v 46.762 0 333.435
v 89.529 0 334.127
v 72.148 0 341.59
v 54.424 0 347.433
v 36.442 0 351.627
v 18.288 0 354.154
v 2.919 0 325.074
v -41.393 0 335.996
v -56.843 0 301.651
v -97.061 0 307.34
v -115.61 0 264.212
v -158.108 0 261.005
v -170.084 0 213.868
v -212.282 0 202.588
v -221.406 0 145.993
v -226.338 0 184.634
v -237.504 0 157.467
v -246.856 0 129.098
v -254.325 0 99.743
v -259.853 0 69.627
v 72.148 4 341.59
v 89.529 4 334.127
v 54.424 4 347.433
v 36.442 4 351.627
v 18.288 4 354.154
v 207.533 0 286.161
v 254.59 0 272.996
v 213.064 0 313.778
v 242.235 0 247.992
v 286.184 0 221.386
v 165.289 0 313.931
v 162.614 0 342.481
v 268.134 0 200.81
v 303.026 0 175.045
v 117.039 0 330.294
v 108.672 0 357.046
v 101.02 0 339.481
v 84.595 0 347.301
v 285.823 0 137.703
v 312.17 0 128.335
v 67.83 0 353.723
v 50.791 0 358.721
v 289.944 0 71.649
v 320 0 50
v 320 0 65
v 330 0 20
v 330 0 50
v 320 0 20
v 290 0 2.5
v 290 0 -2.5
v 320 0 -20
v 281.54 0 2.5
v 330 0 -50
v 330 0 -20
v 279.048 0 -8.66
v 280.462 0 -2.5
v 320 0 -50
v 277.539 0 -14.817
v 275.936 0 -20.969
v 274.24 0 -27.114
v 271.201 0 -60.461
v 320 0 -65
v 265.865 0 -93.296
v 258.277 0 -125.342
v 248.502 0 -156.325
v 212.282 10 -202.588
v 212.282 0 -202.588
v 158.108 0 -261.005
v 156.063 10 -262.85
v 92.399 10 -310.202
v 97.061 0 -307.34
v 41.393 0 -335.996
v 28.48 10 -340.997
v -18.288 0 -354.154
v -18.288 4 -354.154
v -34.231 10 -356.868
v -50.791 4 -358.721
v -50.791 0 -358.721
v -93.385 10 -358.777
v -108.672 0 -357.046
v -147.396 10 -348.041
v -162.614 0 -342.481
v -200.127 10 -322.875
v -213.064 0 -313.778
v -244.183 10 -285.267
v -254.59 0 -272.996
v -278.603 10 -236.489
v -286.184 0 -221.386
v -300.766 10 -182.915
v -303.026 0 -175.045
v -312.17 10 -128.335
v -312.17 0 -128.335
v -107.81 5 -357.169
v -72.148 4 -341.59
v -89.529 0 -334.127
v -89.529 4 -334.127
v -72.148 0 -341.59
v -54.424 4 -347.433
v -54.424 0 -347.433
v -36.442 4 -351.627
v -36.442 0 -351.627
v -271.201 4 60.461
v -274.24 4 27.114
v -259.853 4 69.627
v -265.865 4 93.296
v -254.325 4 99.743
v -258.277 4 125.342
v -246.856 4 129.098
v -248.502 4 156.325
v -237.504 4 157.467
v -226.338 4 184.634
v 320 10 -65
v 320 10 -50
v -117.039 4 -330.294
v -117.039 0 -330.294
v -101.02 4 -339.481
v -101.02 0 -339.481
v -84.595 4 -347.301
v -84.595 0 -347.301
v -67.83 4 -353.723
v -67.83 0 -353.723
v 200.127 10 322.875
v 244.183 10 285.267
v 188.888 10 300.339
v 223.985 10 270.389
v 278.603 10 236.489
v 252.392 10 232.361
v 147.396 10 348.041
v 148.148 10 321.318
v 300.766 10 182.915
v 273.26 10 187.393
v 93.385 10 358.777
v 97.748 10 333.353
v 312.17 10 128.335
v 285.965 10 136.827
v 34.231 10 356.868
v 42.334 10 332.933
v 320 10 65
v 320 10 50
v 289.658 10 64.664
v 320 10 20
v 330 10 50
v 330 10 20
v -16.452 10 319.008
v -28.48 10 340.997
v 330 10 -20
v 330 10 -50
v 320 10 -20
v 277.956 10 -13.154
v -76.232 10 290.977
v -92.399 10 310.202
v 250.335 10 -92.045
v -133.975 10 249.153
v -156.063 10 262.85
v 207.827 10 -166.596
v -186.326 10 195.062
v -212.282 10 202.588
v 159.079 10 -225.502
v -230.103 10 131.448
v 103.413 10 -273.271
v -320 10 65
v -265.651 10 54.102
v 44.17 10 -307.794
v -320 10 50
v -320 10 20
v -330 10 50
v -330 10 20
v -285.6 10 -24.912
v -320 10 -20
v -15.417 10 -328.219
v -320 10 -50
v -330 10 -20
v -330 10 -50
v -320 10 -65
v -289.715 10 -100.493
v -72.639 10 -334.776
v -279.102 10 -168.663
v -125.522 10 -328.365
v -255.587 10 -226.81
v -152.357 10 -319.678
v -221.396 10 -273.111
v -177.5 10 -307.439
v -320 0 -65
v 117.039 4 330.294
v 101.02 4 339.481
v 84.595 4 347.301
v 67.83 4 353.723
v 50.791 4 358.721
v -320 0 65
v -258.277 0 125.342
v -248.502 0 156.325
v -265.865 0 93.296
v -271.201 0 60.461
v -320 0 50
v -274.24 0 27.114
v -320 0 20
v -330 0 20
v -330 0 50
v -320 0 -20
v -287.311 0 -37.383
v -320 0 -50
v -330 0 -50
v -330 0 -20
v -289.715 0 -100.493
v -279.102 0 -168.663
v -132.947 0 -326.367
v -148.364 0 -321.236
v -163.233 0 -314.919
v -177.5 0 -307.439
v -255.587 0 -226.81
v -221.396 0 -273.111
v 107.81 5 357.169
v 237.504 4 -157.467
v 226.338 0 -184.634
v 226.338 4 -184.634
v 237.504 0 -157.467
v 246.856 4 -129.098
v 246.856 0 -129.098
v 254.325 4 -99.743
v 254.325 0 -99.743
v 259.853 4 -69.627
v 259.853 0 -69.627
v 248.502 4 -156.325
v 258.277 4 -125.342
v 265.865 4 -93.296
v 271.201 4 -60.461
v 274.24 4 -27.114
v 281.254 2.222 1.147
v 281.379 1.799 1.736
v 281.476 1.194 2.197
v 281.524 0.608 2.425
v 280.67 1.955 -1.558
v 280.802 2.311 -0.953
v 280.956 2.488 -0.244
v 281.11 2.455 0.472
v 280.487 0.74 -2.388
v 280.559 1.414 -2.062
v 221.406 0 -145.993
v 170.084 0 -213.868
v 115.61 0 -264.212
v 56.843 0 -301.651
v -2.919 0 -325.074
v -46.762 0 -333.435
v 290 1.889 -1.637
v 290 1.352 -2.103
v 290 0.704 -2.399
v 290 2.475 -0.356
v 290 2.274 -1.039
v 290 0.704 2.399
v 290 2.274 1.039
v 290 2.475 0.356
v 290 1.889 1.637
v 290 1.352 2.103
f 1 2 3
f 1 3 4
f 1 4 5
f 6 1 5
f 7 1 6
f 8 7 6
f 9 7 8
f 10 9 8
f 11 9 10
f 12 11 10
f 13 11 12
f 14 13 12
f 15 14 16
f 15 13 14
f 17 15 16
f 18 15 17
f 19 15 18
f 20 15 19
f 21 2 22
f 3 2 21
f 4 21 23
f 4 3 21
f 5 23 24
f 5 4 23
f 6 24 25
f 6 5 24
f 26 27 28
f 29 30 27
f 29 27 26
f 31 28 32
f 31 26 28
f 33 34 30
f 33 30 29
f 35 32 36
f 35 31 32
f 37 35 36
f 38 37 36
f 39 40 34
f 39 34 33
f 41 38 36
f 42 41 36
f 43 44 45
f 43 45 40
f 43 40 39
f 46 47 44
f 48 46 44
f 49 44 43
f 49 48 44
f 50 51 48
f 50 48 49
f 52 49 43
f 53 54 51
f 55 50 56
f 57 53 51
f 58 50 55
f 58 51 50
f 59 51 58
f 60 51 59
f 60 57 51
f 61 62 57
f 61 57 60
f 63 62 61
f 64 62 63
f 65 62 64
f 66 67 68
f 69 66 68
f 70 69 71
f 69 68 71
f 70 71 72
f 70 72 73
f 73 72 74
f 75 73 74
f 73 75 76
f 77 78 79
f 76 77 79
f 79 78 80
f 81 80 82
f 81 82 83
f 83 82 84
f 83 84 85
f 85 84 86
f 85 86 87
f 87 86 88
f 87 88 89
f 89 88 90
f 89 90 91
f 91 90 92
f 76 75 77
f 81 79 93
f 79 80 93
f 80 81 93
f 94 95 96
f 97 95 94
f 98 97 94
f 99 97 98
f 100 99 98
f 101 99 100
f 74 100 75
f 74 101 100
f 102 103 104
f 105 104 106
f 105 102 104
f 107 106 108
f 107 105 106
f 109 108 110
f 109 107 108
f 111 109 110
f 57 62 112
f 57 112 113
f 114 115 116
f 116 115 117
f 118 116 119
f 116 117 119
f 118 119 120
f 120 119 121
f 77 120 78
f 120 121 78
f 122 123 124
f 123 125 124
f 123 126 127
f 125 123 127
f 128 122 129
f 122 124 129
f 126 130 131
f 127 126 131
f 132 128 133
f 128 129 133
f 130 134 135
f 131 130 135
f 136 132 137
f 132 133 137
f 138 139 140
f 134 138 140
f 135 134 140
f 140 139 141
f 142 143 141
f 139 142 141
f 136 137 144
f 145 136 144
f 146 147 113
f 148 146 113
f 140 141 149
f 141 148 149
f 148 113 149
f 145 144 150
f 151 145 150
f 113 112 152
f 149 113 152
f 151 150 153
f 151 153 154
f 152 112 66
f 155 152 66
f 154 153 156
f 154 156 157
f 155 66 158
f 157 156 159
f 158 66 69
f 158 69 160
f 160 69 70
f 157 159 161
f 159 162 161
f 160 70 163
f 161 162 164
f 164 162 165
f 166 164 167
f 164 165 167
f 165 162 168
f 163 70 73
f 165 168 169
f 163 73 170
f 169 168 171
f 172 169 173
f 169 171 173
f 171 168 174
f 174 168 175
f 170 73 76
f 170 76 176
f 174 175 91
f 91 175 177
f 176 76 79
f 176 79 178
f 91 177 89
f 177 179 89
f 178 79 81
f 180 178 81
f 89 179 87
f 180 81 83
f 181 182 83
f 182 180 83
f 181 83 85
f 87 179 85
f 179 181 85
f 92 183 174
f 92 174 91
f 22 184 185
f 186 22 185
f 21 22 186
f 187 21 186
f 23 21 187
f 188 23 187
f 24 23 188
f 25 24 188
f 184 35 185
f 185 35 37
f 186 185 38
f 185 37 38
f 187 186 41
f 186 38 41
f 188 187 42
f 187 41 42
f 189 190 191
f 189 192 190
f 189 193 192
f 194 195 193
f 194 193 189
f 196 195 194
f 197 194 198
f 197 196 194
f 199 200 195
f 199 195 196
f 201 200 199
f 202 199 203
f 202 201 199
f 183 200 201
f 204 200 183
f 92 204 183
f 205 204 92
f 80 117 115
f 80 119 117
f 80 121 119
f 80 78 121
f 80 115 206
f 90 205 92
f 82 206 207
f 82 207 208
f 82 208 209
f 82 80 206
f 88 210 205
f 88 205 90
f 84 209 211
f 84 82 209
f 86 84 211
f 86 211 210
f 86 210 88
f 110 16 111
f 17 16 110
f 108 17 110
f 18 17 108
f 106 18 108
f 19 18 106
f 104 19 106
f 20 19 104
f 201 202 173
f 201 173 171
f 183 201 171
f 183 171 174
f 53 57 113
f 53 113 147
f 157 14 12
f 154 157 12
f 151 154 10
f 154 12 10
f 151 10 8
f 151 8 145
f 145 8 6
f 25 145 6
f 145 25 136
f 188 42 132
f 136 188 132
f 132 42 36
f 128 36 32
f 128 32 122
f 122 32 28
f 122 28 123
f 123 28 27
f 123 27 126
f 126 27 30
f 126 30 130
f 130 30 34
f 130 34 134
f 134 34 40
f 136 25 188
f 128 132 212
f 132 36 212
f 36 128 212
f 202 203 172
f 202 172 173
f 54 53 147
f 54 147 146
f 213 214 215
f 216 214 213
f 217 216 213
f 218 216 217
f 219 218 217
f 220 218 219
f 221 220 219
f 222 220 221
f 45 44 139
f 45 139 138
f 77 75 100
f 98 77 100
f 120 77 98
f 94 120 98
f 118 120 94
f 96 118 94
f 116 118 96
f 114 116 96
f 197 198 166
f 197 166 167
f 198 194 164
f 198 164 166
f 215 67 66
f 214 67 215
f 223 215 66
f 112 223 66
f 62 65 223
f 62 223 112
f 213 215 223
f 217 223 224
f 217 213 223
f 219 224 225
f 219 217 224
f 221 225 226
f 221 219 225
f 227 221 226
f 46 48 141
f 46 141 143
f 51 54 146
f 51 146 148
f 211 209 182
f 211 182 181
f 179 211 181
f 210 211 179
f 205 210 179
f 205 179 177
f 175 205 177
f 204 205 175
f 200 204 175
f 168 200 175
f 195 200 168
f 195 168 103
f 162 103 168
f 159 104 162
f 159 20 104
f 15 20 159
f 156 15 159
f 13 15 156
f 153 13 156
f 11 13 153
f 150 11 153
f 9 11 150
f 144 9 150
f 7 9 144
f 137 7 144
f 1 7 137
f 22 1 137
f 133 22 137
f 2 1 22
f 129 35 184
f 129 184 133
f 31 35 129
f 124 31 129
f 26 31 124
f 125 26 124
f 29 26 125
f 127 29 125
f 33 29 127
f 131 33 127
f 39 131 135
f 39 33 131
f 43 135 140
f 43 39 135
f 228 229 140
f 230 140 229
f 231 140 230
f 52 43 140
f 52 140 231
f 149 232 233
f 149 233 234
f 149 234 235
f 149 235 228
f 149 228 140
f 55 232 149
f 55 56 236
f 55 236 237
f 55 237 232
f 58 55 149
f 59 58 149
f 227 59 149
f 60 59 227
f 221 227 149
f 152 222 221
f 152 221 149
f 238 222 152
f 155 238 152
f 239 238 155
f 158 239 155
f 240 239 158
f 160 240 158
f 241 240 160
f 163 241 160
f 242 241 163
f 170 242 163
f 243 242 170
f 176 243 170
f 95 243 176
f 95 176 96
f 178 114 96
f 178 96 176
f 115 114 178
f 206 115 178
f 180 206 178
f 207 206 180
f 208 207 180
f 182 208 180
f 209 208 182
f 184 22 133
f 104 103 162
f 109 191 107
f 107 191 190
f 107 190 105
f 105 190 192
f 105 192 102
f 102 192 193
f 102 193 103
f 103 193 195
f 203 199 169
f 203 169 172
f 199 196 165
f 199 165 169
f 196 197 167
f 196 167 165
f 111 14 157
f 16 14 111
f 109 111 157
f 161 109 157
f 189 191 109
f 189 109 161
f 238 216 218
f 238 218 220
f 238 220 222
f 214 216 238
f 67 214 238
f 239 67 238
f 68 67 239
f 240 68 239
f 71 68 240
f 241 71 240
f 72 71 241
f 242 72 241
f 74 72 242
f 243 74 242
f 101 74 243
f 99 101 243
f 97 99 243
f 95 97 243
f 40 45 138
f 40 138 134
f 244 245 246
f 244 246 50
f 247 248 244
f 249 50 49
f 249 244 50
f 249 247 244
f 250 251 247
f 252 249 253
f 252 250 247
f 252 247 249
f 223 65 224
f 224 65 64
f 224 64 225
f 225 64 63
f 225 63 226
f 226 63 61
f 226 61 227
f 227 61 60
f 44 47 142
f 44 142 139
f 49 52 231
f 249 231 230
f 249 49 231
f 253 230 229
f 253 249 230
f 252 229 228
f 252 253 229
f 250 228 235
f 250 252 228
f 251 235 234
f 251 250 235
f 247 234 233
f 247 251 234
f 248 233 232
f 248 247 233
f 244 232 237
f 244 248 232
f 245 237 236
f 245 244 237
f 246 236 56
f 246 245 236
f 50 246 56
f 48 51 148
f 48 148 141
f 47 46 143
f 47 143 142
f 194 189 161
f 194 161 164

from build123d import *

# Parameters (mm, degrees)
SKETCH1_RX          = 355
SKETCH1_RY          = 265
BOSS_EXTRUDE1_DEPTH = 10
SKETCH2_RX          = 365
SKETCH2_RY          = 275
SKETCH2_RX_2        = 355
SKETCH2_RY_2        = 265
CUT_EXTRUDE1_DEPTH  = 4
CUT_EXTRUDE5_DEPTH  = 10


with BuildPart() as part:
    # Sketch1 → Boss-Extrude1 (new body)
    with BuildSketch(Plane(origin=(0, 0, 0), x_dir=(1, 0, 0), z_dir=(0, 1, 0))):
        with BuildLine():
            Line((-320, 50), (-320, 65))
            Line((-320, 65), (-312.170159719, 128.33520269))
            add(Edge.make_bspline(
                [(212.28214963, 202.588475219), (-232.721291269, 770.993291043), (-312.170159719, 128.33520269)],
                knots=[4.895798945, 4.895798945, 4.895798945, 7.074054013, 7.074054013, 7.074054013], degree=2, weights=[1, 0.463258742, 1]))
            Line((212.28214963, 202.588475219), (320, 65))
            Line((320, 65), (320, 50))
            Line((320, 50), (330, 50))
            Line((330, 50), (330, 20))
            Line((330, 20), (320, 20))
            Line((320, 20), (320, 0))
            Line((320, 0), (320, -20))
            Line((320, -20), (330, -20))
            Line((330, -20), (330, -50))
            Line((330, -50), (320, -50))
            Line((320, -50), (320, -65))
            Line((320, -65), (312.170159719, -128.33520269))
            add(Edge.make_bspline(
                [(-212.28214963, -202.588475219), (232.721291269, -770.993291043), (312.170159719, -128.33520269)],
                knots=[1.754206291, 1.754206291, 1.754206291, 3.932461359, 3.932461359, 3.932461359], degree=2, weights=[1, 0.463258742, 1]))
            Line((-212.28214963, -202.588475219), (-320, -65))
            Line((-320, -65), (-320, -50))
            Line((-320, -50), (-330, -50))
            Line((-330, -50), (-330, -20))
            Line((-330, -20), (-320, -20))
            Line((-320, -20), (-320, 0))
            Line((-320, 0), (-320, 20))
            Line((-320, 20), (-330, 20))
            Line((-330, 20), (-330, 50))
            Line((-330, 50), (-320, 50))
        make_face()
        with Locations(Location((0, 0), (0, 0, 120))):
            Ellipse(SKETCH1_RX, SKETCH1_RY, mode=Mode.SUBTRACT)
    extrude(amount=BOSS_EXTRUDE1_DEPTH)

    # Sketch2 → Cut-Extrude1 (cut)
    with BuildSketch(Plane.XZ):
        with Locations(Location((0, 0), (0, 0, 90))):
            Ellipse(SKETCH2_RX, SKETCH2_RY)
        with Locations(Location((0, 0), (0, 0, 90))):
            Ellipse(SKETCH2_RX_2, SKETCH2_RY_2, mode=Mode.SUBTRACT)
    extrude(amount=-CUT_EXTRUDE1_DEPTH, mode=Mode.SUBTRACT)

    # Sketch5 → Cut-Extrude5 (cut)
    with BuildSketch(Plane(origin=(290, 0, 0), x_dir=(0, 0, -1), z_dir=(1, 0, 0))):
        with BuildLine():
            Line((-2.5, 0), (2.5, 0))
            ThreePointArc((2.5, 0), (0, 2.5), (-2.5, 0))
        make_face()
    extrude(amount=-CUT_EXTRUDE5_DEPTH, mode=Mode.SUBTRACT)


solid = part.part
